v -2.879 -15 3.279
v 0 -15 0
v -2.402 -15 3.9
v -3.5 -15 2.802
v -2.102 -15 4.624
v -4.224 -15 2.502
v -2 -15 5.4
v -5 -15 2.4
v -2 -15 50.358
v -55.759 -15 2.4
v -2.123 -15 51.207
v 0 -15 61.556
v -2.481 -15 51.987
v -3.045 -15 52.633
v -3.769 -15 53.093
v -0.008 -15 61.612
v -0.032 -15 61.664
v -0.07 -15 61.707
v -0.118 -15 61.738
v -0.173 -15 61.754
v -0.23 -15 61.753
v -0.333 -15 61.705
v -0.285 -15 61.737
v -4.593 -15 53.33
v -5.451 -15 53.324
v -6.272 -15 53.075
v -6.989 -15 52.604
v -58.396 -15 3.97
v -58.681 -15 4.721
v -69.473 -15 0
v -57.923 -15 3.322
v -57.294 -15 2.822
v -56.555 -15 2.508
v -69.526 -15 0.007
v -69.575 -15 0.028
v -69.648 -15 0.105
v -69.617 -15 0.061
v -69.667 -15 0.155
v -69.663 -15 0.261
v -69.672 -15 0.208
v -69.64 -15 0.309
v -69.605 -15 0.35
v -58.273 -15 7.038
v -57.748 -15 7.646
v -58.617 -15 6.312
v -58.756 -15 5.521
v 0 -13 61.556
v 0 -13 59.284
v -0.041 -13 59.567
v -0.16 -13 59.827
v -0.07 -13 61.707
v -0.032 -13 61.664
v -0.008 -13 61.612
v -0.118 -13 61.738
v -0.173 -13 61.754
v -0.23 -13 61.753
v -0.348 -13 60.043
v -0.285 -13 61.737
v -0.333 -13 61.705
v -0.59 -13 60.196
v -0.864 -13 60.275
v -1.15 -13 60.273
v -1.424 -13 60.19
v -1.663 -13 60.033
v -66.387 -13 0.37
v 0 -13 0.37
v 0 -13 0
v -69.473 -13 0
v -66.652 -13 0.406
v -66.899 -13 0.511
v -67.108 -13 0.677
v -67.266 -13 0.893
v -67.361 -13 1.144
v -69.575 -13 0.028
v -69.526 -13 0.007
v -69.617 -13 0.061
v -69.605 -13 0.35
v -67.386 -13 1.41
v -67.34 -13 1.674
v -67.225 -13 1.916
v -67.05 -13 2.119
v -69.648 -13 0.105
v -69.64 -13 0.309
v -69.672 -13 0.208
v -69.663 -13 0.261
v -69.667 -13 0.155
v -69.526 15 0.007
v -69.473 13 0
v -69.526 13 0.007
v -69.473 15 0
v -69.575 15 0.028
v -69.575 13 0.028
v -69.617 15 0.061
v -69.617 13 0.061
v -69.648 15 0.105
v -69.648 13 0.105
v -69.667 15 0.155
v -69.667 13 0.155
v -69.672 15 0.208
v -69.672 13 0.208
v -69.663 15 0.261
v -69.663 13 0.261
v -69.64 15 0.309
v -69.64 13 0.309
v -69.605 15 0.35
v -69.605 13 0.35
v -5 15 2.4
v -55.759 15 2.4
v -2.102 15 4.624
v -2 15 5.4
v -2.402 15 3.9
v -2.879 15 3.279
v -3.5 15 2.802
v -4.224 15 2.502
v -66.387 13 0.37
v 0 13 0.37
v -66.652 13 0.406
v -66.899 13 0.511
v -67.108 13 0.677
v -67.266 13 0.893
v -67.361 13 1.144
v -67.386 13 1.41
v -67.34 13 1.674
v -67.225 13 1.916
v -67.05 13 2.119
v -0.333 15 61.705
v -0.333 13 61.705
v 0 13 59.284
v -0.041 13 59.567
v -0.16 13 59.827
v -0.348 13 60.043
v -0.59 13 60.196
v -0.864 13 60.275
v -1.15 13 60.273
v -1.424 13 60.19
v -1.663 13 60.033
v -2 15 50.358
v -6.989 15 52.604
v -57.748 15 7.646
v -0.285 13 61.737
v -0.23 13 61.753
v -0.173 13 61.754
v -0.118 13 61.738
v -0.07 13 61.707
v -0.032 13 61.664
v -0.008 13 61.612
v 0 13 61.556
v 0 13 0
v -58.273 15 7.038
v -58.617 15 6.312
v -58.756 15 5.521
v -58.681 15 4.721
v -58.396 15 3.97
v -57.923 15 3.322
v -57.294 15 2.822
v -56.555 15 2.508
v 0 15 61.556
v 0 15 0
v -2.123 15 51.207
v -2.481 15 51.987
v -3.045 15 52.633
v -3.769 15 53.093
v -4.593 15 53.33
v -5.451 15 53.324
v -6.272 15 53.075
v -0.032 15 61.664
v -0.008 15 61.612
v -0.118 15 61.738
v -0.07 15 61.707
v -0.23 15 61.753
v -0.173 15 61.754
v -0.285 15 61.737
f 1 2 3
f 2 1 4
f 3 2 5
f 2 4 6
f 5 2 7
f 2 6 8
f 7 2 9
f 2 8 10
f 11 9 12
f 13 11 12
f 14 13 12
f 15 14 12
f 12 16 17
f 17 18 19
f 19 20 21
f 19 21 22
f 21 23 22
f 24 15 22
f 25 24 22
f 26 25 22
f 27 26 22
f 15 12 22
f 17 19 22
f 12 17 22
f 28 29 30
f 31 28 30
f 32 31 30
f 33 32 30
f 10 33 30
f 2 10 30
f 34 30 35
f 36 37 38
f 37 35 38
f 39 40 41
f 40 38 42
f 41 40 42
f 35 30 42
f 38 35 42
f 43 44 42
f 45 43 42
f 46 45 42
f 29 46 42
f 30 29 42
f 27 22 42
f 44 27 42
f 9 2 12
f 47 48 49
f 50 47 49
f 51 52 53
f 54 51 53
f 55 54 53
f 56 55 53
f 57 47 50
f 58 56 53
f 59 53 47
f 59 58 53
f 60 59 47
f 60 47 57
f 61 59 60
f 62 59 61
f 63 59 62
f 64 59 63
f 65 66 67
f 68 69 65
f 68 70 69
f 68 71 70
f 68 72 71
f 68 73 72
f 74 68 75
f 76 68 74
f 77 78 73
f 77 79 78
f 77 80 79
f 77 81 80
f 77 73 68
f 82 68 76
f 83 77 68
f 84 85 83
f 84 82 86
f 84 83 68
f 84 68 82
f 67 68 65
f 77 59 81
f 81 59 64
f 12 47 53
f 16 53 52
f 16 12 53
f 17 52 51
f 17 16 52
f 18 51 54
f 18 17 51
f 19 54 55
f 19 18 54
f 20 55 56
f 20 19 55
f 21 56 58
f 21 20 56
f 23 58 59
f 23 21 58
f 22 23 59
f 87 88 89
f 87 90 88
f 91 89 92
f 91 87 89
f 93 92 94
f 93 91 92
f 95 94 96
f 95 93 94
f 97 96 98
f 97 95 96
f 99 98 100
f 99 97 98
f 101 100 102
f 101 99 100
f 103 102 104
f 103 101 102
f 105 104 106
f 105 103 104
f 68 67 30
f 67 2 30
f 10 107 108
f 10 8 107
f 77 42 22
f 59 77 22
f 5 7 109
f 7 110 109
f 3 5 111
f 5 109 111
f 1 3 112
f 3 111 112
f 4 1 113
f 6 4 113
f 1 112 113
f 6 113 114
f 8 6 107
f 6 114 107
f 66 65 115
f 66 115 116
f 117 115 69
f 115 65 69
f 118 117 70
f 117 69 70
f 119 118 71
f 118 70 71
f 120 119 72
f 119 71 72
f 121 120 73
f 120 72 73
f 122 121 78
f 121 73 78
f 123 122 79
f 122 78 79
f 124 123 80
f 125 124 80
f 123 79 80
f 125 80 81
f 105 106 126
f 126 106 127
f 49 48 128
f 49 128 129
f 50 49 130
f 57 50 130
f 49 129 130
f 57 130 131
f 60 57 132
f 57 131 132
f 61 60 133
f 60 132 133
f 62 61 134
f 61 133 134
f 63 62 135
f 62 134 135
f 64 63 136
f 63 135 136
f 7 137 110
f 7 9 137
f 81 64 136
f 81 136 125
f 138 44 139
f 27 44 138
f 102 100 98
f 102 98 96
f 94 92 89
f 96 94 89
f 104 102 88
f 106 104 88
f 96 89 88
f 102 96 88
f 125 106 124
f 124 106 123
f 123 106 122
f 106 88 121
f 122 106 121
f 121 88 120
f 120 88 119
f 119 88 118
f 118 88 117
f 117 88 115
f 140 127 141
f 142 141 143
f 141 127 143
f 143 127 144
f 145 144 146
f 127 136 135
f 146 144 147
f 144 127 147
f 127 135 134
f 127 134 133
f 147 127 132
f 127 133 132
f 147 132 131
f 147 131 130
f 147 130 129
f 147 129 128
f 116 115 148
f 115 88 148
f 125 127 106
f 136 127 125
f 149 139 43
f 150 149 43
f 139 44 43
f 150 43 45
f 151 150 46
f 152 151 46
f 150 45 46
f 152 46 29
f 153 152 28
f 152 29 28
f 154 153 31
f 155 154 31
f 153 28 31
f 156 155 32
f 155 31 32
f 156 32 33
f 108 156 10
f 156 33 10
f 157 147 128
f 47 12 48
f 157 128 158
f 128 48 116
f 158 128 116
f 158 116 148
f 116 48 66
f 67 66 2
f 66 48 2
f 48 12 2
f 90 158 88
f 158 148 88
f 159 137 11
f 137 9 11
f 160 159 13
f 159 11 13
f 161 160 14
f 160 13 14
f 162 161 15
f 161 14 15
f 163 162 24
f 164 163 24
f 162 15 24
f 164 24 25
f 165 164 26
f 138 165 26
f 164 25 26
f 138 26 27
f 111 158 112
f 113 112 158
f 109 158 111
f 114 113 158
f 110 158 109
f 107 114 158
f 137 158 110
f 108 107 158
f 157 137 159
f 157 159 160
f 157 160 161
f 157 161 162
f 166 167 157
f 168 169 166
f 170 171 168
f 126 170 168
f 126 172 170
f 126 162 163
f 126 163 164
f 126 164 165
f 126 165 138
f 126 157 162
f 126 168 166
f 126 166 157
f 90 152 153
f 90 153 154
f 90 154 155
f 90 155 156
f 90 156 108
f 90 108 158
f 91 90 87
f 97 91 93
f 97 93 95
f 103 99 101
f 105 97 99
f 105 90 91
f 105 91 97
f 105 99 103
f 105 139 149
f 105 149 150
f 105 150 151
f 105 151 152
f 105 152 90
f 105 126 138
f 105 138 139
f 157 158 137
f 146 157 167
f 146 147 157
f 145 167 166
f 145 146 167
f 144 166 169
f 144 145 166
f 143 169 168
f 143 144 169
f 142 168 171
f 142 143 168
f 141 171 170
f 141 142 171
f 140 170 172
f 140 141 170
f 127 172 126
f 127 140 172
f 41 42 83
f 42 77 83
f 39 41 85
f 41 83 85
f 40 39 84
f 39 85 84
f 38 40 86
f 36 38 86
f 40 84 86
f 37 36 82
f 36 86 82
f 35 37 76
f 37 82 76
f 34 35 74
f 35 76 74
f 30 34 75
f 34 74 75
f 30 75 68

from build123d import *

# Parameters (mm, degrees)
PAD001_DEPTH    = 15
SKETCH003_W     = 93.5093578205
SKETCH003_H     = 26
POCKET_DEPTH    = 0.37
SKETCH004_W     = 69.441960284
SKETCH004_H     = 26
POCKET001_DEPTH = 0.37
FILLET002002_R  = 3
FILLET002003_R  = 0.2
FILLET002004_R  = 1
FILLET002005_R  = 0.2
FILLET002006_R  = 1


with BuildPart() as part:
    # Sketch002 → Pad001 (new body, symmetric)
    with BuildSketch(Plane.XZ):
        Polygon((0, 0), (-70, 0), (0, 62), align=None)
        Polygon((-2, 2.4), (-63.6706055037, 2.4), (-2, 57.0225363033), align=None, mode=Mode.SUBTRACT)
    extrude(amount=PAD001_DEPTH, both=True)

    # Sketch003 (on Face2 of Pad001) → Pocket (cut)
    with BuildSketch(Plane(origin=(-30.7731015554, 0, 34.7438243367), x_dir=(-0.7485881802, 0, -0.6630352453), z_dir=(-0.6630352453, 0, 0.7485881802))):
        with Locations((5.6464937019, 0)):
            Rectangle(SKETCH003_W, SKETCH003_H)
    extrude(amount=-POCKET_DEPTH, mode=Mode.SUBTRACT)

    # Sketch004 (on Face1 of Pocket) → Pocket001 (cut)
    with BuildSketch(Plane(origin=(0, 0, 0), x_dir=(1, 0, 0), z_dir=(0, 0, -1))):
        with Locations((-34.720980142, 0)):
            Rectangle(SKETCH004_W, SKETCH004_H)
    extrude(amount=-POCKET001_DEPTH, mode=Mode.SUBTRACT)

    # Fillet002002
    fillet002002_edges = [part.edges().sort_by_distance(p)[0] for p in [
        (-2, 0, 2.4),
        (-2, 0, 57.022536),
        (-63.670606, 0, 2.4),
    ]]
    fillet(fillet002002_edges, radius=FILLET002002_R)

    # Fillet002003
    fillet002003_edges = [part.edges().sort_by_distance(p)[0] for p in [
        (0, 14, 62),
        (0, -14, 62),
    ]]
    fillet(fillet002003_edges, radius=FILLET002003_R)

    # Fillet002004
    fillet002004_edges = [part.edges().sort_by_distance(p)[0] for p in [
        (0, 0, 61.505736),
    ]]
    fillet(fillet002004_edges, radius=FILLET002004_R)

    # Fillet002005
    fillet002005_edges = [part.edges().sort_by_distance(p)[0] for p in [
        (-70, -14, 0),
        (-70, 14, 0),
    ]]
    fillet(fillet002005_edges, radius=FILLET002005_R)

    # Fillet002006
    fillet002006_edges = [part.edges().sort_by_distance(p)[0] for p in [
        (-69.024218, 0, 0.37),
    ]]
    fillet(fillet002006_edges, radius=FILLET002006_R)


solid = part.part
